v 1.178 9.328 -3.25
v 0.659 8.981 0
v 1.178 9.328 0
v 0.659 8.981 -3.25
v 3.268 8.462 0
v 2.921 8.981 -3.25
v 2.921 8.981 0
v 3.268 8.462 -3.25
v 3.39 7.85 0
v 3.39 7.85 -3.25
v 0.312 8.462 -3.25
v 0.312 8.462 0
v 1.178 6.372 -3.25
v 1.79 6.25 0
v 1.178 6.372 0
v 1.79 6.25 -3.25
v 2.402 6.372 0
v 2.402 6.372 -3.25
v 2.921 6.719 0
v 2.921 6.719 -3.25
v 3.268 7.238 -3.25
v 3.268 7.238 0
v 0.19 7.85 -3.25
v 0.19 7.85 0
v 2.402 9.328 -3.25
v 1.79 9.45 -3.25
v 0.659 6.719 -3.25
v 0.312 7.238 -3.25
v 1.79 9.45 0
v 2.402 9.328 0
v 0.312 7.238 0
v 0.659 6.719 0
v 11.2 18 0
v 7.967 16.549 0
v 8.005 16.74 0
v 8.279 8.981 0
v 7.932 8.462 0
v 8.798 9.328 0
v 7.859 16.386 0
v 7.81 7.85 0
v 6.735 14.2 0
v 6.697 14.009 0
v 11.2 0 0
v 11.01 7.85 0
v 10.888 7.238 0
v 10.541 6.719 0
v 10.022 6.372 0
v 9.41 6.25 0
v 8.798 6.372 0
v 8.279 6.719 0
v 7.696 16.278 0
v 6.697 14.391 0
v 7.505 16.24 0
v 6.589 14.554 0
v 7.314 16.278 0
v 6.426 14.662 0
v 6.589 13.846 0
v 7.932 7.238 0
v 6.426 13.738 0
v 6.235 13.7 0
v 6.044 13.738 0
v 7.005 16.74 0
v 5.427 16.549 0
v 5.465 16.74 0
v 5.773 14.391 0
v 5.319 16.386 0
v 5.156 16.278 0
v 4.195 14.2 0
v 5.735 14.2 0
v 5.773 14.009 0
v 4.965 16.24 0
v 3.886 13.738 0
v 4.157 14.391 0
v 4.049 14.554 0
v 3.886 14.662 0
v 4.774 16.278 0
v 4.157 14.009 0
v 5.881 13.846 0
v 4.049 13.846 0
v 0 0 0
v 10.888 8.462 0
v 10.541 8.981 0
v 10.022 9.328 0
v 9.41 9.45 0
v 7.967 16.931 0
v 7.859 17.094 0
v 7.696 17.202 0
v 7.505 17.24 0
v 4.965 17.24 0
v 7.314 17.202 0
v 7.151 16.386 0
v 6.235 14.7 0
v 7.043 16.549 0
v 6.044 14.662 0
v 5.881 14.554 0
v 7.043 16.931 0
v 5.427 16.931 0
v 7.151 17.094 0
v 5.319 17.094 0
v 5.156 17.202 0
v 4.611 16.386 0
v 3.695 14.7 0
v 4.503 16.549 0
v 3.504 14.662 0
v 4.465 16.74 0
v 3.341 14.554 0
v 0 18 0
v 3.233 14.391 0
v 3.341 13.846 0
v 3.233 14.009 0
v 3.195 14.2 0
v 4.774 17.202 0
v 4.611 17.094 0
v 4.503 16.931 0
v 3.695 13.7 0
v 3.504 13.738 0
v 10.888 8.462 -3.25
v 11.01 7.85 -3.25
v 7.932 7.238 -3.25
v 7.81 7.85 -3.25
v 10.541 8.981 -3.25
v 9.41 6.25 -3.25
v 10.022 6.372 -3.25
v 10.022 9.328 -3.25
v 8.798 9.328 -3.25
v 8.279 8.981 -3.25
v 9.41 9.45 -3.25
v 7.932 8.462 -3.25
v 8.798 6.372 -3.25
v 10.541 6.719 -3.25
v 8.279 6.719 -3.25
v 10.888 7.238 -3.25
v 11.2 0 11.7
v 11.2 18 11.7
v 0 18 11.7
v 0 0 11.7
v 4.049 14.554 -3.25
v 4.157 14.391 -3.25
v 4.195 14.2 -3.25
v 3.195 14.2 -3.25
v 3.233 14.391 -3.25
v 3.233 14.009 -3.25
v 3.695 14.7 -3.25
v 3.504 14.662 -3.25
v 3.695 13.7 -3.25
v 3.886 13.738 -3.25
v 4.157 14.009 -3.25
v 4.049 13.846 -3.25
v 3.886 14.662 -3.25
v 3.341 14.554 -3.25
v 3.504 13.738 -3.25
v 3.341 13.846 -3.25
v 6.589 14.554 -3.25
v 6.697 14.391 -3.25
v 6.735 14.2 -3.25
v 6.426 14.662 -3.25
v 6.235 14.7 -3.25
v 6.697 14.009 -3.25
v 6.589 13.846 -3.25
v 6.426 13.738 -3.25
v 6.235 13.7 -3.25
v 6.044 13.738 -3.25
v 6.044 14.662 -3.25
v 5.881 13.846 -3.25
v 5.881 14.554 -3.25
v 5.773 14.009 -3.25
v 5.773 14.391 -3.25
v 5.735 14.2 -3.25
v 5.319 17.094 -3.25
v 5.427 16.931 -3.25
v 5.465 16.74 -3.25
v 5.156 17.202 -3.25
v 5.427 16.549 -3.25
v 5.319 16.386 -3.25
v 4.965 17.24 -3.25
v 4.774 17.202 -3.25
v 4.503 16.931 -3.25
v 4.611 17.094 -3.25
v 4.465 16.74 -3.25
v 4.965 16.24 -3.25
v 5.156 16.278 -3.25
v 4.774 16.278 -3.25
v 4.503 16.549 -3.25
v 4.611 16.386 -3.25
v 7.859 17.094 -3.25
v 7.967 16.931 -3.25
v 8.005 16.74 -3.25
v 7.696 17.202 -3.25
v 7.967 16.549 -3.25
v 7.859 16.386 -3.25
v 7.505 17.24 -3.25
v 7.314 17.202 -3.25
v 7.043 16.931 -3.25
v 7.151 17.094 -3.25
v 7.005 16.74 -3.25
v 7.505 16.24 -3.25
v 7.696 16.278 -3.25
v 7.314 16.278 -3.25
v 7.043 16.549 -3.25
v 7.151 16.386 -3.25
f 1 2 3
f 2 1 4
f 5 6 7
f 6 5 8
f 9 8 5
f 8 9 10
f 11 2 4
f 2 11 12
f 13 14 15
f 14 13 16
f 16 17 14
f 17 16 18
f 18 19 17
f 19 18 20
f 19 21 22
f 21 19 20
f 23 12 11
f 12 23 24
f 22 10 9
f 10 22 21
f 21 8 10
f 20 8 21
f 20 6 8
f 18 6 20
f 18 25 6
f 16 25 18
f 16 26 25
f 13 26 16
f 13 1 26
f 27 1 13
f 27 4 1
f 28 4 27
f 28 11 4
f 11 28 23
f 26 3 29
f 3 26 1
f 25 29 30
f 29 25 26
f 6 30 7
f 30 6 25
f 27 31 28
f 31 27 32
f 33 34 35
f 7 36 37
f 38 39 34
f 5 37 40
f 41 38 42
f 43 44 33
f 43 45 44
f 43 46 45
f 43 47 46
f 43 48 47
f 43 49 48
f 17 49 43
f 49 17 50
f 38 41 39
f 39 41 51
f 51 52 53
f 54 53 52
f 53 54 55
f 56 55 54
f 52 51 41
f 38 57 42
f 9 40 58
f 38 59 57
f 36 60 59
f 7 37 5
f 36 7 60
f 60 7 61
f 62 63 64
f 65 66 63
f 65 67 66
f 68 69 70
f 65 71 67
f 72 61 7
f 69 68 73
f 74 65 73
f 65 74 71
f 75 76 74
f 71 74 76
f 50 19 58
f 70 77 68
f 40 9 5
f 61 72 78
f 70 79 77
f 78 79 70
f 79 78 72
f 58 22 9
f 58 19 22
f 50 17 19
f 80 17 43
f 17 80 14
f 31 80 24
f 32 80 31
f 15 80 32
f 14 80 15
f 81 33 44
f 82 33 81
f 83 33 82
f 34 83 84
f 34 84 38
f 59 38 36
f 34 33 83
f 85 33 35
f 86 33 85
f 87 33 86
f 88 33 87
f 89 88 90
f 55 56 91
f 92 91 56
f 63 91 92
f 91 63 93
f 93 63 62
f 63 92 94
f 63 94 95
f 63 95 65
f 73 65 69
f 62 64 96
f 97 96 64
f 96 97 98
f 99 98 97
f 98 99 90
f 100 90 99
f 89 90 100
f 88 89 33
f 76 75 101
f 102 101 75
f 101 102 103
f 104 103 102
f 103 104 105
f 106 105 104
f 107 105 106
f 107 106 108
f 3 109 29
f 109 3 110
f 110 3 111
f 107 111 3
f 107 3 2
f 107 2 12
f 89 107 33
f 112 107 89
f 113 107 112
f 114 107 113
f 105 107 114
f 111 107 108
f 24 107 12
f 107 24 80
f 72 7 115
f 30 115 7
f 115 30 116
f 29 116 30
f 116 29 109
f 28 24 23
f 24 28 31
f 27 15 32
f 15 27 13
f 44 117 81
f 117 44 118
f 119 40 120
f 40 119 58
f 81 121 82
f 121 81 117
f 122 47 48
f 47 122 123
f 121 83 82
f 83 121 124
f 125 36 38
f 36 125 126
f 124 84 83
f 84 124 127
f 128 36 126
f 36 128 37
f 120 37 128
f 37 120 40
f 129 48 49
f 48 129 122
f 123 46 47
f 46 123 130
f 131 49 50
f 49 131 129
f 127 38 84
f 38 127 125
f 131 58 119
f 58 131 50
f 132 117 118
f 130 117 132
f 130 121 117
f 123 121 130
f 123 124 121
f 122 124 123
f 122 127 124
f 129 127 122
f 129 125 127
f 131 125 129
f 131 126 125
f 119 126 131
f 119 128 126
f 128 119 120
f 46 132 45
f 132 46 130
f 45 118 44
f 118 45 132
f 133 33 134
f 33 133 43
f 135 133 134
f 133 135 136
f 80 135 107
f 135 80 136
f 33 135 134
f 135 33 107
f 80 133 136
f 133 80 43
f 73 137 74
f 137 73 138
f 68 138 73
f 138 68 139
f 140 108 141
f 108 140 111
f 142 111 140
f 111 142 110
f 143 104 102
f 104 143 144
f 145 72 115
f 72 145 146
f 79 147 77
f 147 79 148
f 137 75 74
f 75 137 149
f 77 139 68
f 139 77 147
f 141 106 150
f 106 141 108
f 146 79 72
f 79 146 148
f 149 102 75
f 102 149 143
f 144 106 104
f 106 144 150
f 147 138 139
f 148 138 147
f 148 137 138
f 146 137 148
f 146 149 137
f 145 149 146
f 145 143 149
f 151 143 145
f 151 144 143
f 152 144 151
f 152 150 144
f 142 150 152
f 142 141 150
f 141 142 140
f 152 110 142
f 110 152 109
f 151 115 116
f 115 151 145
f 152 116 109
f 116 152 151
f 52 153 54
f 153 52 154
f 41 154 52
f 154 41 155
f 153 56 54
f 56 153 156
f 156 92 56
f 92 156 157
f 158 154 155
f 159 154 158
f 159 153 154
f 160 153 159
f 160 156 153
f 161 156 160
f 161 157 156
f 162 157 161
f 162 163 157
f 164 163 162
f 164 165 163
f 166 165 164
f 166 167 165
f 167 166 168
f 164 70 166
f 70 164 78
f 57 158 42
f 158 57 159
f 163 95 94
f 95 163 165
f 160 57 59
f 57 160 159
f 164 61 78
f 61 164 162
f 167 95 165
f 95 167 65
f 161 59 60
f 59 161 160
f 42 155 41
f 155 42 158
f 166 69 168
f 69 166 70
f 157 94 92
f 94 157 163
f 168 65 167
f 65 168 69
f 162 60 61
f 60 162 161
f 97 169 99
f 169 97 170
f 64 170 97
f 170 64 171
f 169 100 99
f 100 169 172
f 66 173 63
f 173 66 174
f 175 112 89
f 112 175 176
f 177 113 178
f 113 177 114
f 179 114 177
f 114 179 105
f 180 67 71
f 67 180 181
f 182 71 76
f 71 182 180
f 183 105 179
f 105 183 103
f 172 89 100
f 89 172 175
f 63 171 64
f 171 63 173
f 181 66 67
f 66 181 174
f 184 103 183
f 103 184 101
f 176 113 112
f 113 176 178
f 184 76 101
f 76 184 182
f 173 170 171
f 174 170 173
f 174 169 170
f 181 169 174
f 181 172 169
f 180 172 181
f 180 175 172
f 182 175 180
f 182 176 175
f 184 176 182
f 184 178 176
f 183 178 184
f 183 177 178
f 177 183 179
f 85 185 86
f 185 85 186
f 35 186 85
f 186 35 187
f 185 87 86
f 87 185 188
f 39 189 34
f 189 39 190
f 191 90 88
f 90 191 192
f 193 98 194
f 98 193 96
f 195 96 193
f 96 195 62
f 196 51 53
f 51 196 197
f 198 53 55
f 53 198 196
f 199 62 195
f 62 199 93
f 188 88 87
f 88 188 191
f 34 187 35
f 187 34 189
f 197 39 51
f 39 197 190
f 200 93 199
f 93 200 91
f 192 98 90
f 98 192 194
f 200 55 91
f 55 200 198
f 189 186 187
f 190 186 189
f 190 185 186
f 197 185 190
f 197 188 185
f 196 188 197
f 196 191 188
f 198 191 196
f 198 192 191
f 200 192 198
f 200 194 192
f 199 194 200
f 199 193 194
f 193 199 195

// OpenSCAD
// Assman RJ-11 thru-hole
//
// from https://www.assmann-wsw.com/uploads/datasheets/ASS_7041_CO.pdf

$fn=16;

module rj11() {
     color("#404040") {
	  cube( [11.2, 18, 11.7]);
	  translate( [(11.2-7.62)/2, 7.85, -3.25]) {
	       cylinder( h=3.25, d=3.2);
	       translate( [7.62, 0, 0])
		    cylinder( h=3.25, d=3.2);
	  }
     }
     color("gold") {
	  translate( [(11.2-3*1.27)/2, 7.85+8.89-2.54, -3.25]) {
	       cylinder( h=3.25, d=1);
	       translate( [2.54, 0, 0]) cylinder( h=3.25, d=1);
	       translate( [1.27, 2.54, 0]) cylinder( h=3.25, d=1);
	       translate( [1.27+2.54, 2.54, 0]) cylinder( h=3.25, d=1);
	  }
     }
}

rj11();
